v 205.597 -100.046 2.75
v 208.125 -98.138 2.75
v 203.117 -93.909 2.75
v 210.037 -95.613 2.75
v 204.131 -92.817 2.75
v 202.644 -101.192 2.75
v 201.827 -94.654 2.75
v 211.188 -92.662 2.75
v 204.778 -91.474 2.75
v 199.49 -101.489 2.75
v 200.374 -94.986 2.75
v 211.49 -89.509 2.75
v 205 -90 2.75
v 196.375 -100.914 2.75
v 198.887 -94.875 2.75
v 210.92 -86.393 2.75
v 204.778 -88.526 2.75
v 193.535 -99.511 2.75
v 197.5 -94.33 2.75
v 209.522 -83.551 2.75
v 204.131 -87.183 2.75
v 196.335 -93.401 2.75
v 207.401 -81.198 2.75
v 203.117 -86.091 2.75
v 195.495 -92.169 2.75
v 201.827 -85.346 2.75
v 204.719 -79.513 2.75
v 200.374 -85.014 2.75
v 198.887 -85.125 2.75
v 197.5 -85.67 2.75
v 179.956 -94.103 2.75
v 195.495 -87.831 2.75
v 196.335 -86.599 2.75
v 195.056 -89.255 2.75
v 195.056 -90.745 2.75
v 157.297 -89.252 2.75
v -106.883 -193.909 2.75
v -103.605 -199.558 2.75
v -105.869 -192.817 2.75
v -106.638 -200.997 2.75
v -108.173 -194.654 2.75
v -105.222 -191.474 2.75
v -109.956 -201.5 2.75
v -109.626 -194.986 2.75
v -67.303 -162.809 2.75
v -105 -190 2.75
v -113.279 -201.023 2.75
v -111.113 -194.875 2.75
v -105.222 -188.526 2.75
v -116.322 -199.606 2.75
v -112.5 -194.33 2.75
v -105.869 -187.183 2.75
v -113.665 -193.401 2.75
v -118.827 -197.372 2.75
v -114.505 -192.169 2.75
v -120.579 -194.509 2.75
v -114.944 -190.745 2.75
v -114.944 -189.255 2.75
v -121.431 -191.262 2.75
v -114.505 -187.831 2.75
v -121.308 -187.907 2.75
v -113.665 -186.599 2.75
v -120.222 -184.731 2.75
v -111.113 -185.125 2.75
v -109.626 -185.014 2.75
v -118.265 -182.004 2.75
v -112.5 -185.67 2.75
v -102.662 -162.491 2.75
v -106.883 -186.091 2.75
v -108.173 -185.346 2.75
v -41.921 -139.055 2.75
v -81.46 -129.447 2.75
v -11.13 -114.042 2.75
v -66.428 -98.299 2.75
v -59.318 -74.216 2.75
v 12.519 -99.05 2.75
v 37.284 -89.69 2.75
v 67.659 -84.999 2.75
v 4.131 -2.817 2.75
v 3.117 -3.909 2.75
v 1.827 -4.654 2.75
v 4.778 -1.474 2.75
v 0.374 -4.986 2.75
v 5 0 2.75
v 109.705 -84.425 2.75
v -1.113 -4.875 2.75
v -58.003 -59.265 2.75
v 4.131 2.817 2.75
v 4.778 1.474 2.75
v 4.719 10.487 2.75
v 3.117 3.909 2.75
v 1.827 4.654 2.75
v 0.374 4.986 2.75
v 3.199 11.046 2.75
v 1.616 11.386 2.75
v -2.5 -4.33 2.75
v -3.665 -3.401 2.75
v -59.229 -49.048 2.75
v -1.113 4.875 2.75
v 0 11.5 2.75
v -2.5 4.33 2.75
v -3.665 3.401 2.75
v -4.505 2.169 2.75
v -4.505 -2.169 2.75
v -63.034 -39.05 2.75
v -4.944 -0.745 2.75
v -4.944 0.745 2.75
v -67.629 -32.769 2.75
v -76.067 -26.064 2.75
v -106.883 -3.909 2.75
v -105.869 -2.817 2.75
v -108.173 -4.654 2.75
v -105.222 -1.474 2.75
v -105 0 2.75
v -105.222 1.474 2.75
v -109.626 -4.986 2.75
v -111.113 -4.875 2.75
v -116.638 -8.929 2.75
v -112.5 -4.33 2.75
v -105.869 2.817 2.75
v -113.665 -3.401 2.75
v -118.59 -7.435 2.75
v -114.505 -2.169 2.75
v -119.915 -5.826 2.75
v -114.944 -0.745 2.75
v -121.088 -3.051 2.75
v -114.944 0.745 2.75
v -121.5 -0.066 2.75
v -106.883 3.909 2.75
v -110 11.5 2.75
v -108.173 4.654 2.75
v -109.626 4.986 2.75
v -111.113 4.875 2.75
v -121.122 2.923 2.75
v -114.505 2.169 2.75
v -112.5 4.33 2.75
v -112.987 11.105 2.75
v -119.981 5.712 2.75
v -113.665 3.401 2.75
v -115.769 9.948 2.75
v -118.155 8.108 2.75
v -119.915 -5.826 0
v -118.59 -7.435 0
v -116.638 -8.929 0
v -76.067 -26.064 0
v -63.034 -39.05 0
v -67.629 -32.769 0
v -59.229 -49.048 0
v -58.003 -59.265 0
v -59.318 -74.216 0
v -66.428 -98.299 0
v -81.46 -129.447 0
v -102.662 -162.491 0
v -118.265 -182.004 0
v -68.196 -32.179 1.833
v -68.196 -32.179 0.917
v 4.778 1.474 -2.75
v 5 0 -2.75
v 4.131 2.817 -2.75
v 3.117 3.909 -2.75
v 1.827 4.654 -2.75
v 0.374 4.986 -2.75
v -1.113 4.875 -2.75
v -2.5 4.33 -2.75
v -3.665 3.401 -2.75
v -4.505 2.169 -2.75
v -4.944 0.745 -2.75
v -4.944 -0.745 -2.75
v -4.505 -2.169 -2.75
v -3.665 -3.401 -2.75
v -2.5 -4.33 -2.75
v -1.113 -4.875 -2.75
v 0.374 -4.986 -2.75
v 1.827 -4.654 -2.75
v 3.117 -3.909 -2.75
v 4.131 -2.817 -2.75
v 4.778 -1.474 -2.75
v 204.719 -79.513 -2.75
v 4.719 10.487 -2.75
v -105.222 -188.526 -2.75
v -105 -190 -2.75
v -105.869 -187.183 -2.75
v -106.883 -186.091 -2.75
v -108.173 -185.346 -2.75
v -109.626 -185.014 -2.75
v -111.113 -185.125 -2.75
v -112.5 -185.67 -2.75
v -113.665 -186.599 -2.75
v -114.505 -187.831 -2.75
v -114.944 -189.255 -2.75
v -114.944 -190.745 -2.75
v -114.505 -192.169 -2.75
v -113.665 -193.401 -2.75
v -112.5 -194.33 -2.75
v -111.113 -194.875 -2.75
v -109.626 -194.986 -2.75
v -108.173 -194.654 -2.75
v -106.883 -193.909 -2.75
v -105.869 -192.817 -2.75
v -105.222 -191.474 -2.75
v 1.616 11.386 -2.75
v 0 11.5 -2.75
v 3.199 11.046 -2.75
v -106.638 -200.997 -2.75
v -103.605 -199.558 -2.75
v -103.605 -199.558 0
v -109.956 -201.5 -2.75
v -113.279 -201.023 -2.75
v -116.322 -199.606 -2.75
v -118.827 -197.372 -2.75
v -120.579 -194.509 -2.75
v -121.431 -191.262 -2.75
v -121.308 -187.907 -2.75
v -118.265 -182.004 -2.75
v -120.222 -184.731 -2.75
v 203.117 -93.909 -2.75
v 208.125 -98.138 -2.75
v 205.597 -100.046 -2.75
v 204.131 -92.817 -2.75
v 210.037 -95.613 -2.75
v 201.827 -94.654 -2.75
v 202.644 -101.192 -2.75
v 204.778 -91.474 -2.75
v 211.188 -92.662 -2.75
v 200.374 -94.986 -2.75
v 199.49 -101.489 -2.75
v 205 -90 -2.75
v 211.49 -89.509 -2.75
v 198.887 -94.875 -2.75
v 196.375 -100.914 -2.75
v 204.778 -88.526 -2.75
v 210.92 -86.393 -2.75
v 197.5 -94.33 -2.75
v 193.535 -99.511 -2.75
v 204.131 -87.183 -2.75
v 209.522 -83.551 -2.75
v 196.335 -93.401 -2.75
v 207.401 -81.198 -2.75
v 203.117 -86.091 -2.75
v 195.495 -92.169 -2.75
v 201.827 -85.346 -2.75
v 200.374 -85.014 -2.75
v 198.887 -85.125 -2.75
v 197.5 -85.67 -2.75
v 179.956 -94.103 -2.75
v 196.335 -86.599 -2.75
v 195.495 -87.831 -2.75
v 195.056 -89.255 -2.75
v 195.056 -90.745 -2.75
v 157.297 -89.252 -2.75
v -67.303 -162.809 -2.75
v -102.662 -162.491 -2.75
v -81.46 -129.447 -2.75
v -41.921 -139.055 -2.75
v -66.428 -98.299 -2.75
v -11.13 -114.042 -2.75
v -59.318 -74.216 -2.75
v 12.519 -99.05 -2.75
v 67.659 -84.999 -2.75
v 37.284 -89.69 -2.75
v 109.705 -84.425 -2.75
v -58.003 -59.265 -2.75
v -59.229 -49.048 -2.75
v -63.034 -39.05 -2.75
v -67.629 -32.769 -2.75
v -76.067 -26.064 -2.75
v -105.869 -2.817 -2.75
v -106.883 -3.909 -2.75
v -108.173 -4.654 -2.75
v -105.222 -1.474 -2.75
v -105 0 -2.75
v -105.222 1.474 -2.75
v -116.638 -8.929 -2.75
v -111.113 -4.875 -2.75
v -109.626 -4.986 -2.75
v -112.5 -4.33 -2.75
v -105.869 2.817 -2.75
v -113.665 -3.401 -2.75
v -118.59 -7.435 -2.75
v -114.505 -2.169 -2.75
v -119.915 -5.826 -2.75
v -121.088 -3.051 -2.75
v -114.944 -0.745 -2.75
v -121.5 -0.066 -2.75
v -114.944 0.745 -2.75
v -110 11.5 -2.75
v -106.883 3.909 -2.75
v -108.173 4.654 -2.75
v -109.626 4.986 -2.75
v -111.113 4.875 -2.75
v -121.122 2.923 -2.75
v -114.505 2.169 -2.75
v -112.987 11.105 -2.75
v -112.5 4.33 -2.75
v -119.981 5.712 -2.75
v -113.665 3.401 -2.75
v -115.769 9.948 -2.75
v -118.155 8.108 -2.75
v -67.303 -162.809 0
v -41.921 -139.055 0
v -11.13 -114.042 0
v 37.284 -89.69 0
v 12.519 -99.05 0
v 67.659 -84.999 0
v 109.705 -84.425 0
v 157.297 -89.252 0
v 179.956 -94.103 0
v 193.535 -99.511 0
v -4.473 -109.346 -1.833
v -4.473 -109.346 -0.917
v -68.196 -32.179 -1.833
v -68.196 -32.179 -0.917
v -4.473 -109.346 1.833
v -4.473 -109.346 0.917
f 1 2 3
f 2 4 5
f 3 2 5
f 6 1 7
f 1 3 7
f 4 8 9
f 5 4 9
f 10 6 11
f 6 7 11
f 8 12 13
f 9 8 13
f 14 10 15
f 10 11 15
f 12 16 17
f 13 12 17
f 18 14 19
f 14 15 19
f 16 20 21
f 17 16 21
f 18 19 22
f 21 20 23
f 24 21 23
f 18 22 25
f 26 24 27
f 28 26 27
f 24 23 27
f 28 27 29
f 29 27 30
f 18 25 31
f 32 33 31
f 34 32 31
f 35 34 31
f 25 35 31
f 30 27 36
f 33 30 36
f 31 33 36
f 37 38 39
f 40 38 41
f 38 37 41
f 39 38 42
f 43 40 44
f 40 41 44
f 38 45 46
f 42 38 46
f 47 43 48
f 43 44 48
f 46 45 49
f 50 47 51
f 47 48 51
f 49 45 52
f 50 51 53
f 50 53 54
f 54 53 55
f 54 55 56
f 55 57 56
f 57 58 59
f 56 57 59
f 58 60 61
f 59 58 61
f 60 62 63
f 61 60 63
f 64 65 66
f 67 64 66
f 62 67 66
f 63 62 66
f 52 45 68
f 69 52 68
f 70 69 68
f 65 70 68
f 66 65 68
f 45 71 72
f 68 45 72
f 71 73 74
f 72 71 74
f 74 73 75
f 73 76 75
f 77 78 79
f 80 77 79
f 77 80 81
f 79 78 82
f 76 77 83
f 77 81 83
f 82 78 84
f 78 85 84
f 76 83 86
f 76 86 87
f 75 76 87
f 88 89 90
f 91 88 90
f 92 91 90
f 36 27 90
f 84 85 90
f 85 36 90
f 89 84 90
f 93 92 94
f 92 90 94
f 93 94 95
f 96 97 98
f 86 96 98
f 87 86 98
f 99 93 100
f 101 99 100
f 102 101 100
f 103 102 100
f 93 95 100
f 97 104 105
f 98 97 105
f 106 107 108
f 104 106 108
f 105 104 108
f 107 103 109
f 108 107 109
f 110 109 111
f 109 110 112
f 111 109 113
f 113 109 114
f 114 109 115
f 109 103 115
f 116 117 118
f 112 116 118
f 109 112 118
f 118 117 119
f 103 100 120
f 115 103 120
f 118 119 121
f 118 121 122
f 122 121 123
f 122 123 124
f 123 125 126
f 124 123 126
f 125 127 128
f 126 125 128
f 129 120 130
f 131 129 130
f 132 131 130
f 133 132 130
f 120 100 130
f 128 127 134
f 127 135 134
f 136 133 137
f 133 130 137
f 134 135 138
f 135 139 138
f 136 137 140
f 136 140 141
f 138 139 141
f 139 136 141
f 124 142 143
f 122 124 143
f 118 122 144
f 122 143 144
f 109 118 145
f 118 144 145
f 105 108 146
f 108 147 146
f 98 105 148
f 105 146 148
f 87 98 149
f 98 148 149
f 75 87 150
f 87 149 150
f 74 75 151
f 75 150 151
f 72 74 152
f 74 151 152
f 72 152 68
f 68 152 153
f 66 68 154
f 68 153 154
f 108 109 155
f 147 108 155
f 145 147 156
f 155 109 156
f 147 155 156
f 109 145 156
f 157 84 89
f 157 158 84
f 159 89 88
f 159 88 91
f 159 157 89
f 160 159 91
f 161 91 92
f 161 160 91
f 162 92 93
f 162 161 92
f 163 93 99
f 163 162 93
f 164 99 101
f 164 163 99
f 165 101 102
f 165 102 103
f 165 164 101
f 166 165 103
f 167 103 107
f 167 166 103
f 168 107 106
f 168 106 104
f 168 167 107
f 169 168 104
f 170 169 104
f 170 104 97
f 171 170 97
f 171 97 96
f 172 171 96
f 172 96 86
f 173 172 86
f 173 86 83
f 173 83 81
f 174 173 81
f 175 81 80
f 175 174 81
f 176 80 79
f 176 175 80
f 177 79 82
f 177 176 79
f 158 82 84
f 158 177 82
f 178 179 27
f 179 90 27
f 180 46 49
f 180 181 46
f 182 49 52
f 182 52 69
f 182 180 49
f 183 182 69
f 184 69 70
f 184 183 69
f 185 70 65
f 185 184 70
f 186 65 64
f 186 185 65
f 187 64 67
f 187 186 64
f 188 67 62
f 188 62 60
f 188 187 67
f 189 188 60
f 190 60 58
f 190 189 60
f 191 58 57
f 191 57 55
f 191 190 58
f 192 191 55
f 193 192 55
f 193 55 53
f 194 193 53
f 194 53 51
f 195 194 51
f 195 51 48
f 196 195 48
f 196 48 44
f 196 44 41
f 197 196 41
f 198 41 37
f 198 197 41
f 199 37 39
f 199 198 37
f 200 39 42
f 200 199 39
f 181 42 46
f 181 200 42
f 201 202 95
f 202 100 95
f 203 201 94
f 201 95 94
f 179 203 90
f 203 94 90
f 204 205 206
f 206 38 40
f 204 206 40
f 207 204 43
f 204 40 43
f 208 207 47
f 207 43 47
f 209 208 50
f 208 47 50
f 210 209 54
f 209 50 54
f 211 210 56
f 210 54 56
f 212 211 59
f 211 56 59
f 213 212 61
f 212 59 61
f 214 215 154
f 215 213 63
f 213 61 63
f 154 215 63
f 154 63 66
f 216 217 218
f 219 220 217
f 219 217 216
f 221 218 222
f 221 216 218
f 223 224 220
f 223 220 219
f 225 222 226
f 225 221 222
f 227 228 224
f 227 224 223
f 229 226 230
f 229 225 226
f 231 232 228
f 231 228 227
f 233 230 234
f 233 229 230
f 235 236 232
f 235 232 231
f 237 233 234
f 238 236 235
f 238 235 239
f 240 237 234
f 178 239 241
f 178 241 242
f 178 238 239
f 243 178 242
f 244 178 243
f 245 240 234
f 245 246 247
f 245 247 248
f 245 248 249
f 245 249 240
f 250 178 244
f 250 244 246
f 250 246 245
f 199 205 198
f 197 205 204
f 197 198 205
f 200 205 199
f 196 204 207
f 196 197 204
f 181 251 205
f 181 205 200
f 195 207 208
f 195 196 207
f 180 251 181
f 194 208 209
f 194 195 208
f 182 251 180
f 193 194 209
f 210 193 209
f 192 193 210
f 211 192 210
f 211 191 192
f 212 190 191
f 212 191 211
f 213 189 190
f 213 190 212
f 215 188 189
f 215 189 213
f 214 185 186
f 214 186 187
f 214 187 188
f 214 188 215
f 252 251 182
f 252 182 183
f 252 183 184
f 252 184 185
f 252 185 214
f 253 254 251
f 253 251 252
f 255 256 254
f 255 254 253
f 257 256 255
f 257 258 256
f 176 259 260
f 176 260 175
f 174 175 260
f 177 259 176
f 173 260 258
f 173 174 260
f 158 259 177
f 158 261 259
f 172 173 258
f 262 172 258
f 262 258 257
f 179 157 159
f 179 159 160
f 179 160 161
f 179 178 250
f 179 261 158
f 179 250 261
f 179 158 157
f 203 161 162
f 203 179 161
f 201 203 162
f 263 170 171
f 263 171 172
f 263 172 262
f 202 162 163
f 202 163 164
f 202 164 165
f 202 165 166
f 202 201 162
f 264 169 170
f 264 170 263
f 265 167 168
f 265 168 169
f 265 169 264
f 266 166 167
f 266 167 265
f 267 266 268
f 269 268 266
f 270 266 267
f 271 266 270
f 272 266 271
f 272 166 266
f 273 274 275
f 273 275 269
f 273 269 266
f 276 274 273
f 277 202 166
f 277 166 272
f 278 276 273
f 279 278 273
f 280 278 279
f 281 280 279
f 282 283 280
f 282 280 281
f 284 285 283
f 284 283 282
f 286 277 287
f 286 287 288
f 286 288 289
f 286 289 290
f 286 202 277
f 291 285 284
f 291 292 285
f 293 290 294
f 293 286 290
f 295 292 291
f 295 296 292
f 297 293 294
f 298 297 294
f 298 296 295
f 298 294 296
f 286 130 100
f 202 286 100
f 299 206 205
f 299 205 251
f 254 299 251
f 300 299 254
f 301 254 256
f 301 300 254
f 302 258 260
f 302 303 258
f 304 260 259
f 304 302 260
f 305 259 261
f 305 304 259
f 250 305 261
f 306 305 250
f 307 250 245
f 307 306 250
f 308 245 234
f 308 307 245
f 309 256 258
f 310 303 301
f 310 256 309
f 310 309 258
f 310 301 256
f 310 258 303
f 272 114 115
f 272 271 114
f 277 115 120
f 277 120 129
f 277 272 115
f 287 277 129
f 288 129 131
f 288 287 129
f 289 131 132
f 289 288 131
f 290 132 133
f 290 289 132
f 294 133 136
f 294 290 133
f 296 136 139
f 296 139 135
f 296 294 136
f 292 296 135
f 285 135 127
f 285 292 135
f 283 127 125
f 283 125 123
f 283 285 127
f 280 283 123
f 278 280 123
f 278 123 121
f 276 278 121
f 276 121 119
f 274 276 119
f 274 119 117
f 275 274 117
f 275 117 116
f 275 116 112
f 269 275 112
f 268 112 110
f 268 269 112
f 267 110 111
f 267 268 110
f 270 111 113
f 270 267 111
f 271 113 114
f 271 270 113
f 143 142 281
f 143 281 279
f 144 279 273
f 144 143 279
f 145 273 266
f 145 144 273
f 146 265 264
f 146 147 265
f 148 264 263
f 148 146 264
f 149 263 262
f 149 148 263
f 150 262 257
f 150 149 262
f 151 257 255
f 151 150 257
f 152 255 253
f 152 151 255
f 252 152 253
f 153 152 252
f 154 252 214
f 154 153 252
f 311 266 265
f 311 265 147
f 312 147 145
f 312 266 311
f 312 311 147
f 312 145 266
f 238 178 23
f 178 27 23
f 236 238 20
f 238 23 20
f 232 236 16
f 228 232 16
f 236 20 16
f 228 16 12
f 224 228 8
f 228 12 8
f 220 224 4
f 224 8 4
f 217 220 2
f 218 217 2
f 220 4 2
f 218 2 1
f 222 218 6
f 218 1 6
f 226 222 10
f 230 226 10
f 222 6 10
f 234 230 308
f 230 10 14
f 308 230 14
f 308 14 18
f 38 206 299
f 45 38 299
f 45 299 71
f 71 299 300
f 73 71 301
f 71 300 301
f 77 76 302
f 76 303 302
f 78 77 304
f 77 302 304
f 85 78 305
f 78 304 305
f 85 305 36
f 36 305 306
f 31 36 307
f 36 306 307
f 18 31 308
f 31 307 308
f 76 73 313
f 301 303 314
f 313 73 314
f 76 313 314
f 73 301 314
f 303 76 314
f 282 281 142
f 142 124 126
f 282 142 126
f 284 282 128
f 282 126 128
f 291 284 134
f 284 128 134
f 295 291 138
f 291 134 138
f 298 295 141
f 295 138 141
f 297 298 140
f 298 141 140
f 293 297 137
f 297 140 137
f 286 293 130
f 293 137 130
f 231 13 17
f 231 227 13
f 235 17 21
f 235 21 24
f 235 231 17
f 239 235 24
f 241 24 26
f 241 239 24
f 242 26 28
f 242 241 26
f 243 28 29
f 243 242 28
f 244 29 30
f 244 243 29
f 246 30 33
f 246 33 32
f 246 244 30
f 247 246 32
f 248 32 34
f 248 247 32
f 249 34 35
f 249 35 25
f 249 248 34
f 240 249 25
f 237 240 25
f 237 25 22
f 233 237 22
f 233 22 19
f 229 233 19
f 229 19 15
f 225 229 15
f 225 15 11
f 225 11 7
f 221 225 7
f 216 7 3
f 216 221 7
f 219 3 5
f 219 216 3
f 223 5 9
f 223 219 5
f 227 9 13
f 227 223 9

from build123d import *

# Parameters (mm, degrees)
SKETCH1_R       = 5
LINK_BCEF_DEPTH = 2.75


with BuildPart() as part:
    # Sketch1 → link_BCEF (new body, symmetric)
    with BuildSketch(Plane.XY):
        with BuildLine():
            Line((-110, 11.5), (0, 11.5))
            ThreePointArc((0, 11.5), (2.413335963, 11.243923227), (4.719193789, 10.48709731))
            Line((4.719193789, 10.48709731), (204.719193789, -79.51290269))
            ThreePointArc((204.719193789, -79.51290269), (210.037033264, -95.613195459), (193.535322949, -99.510938472))
            add(Edge.make_bspline(
                [(-103.605175934, -199.558045049), (-99.166641345, -196.588436969), (-37.747767195, -126.045876693), (58.834709745, -72.841025291), (177.378760182, -88.529166185), (193.535322949, -99.510938472)],
                knots=[0, 0, 0, 0, 0.472274196, 0.59836262, 1, 1, 1, 1], degree=3))
            ThreePointArc((-103.605175934, -199.558045049), (-118.826673208, -197.371556151), (-118.265297035, -182.004071979))
            add(Edge.make_bspline(
                [(-119.914835658, -5.8263225), (-114.934982102, -14.300695419), (-66.448192668, -18.69275386), (-46.813712441, -89.406939193), (-106.083618348, -169.412013562), (-118.265297035, -182.004071979)],
                knots=[0, 0, 0, 0, 0.300298834, 0.455611494, 1, 1, 1, 1], degree=3))
            ThreePointArc((-119.914835658, -5.8263225), (-119.981300235, 5.711711269), (-110, 11.5))
        make_face()
        Circle(SKETCH1_R, mode=Mode.SUBTRACT)
        with Locations((200, -90)):
            Circle(SKETCH1_R, mode=Mode.SUBTRACT)
        with Locations((-110, -190)):
            Circle(SKETCH1_R, mode=Mode.SUBTRACT)
        with Locations((-110, 0)):
            Circle(SKETCH1_R, mode=Mode.SUBTRACT)
    extrude(amount=LINK_BCEF_DEPTH, both=True)


solid = part.part
